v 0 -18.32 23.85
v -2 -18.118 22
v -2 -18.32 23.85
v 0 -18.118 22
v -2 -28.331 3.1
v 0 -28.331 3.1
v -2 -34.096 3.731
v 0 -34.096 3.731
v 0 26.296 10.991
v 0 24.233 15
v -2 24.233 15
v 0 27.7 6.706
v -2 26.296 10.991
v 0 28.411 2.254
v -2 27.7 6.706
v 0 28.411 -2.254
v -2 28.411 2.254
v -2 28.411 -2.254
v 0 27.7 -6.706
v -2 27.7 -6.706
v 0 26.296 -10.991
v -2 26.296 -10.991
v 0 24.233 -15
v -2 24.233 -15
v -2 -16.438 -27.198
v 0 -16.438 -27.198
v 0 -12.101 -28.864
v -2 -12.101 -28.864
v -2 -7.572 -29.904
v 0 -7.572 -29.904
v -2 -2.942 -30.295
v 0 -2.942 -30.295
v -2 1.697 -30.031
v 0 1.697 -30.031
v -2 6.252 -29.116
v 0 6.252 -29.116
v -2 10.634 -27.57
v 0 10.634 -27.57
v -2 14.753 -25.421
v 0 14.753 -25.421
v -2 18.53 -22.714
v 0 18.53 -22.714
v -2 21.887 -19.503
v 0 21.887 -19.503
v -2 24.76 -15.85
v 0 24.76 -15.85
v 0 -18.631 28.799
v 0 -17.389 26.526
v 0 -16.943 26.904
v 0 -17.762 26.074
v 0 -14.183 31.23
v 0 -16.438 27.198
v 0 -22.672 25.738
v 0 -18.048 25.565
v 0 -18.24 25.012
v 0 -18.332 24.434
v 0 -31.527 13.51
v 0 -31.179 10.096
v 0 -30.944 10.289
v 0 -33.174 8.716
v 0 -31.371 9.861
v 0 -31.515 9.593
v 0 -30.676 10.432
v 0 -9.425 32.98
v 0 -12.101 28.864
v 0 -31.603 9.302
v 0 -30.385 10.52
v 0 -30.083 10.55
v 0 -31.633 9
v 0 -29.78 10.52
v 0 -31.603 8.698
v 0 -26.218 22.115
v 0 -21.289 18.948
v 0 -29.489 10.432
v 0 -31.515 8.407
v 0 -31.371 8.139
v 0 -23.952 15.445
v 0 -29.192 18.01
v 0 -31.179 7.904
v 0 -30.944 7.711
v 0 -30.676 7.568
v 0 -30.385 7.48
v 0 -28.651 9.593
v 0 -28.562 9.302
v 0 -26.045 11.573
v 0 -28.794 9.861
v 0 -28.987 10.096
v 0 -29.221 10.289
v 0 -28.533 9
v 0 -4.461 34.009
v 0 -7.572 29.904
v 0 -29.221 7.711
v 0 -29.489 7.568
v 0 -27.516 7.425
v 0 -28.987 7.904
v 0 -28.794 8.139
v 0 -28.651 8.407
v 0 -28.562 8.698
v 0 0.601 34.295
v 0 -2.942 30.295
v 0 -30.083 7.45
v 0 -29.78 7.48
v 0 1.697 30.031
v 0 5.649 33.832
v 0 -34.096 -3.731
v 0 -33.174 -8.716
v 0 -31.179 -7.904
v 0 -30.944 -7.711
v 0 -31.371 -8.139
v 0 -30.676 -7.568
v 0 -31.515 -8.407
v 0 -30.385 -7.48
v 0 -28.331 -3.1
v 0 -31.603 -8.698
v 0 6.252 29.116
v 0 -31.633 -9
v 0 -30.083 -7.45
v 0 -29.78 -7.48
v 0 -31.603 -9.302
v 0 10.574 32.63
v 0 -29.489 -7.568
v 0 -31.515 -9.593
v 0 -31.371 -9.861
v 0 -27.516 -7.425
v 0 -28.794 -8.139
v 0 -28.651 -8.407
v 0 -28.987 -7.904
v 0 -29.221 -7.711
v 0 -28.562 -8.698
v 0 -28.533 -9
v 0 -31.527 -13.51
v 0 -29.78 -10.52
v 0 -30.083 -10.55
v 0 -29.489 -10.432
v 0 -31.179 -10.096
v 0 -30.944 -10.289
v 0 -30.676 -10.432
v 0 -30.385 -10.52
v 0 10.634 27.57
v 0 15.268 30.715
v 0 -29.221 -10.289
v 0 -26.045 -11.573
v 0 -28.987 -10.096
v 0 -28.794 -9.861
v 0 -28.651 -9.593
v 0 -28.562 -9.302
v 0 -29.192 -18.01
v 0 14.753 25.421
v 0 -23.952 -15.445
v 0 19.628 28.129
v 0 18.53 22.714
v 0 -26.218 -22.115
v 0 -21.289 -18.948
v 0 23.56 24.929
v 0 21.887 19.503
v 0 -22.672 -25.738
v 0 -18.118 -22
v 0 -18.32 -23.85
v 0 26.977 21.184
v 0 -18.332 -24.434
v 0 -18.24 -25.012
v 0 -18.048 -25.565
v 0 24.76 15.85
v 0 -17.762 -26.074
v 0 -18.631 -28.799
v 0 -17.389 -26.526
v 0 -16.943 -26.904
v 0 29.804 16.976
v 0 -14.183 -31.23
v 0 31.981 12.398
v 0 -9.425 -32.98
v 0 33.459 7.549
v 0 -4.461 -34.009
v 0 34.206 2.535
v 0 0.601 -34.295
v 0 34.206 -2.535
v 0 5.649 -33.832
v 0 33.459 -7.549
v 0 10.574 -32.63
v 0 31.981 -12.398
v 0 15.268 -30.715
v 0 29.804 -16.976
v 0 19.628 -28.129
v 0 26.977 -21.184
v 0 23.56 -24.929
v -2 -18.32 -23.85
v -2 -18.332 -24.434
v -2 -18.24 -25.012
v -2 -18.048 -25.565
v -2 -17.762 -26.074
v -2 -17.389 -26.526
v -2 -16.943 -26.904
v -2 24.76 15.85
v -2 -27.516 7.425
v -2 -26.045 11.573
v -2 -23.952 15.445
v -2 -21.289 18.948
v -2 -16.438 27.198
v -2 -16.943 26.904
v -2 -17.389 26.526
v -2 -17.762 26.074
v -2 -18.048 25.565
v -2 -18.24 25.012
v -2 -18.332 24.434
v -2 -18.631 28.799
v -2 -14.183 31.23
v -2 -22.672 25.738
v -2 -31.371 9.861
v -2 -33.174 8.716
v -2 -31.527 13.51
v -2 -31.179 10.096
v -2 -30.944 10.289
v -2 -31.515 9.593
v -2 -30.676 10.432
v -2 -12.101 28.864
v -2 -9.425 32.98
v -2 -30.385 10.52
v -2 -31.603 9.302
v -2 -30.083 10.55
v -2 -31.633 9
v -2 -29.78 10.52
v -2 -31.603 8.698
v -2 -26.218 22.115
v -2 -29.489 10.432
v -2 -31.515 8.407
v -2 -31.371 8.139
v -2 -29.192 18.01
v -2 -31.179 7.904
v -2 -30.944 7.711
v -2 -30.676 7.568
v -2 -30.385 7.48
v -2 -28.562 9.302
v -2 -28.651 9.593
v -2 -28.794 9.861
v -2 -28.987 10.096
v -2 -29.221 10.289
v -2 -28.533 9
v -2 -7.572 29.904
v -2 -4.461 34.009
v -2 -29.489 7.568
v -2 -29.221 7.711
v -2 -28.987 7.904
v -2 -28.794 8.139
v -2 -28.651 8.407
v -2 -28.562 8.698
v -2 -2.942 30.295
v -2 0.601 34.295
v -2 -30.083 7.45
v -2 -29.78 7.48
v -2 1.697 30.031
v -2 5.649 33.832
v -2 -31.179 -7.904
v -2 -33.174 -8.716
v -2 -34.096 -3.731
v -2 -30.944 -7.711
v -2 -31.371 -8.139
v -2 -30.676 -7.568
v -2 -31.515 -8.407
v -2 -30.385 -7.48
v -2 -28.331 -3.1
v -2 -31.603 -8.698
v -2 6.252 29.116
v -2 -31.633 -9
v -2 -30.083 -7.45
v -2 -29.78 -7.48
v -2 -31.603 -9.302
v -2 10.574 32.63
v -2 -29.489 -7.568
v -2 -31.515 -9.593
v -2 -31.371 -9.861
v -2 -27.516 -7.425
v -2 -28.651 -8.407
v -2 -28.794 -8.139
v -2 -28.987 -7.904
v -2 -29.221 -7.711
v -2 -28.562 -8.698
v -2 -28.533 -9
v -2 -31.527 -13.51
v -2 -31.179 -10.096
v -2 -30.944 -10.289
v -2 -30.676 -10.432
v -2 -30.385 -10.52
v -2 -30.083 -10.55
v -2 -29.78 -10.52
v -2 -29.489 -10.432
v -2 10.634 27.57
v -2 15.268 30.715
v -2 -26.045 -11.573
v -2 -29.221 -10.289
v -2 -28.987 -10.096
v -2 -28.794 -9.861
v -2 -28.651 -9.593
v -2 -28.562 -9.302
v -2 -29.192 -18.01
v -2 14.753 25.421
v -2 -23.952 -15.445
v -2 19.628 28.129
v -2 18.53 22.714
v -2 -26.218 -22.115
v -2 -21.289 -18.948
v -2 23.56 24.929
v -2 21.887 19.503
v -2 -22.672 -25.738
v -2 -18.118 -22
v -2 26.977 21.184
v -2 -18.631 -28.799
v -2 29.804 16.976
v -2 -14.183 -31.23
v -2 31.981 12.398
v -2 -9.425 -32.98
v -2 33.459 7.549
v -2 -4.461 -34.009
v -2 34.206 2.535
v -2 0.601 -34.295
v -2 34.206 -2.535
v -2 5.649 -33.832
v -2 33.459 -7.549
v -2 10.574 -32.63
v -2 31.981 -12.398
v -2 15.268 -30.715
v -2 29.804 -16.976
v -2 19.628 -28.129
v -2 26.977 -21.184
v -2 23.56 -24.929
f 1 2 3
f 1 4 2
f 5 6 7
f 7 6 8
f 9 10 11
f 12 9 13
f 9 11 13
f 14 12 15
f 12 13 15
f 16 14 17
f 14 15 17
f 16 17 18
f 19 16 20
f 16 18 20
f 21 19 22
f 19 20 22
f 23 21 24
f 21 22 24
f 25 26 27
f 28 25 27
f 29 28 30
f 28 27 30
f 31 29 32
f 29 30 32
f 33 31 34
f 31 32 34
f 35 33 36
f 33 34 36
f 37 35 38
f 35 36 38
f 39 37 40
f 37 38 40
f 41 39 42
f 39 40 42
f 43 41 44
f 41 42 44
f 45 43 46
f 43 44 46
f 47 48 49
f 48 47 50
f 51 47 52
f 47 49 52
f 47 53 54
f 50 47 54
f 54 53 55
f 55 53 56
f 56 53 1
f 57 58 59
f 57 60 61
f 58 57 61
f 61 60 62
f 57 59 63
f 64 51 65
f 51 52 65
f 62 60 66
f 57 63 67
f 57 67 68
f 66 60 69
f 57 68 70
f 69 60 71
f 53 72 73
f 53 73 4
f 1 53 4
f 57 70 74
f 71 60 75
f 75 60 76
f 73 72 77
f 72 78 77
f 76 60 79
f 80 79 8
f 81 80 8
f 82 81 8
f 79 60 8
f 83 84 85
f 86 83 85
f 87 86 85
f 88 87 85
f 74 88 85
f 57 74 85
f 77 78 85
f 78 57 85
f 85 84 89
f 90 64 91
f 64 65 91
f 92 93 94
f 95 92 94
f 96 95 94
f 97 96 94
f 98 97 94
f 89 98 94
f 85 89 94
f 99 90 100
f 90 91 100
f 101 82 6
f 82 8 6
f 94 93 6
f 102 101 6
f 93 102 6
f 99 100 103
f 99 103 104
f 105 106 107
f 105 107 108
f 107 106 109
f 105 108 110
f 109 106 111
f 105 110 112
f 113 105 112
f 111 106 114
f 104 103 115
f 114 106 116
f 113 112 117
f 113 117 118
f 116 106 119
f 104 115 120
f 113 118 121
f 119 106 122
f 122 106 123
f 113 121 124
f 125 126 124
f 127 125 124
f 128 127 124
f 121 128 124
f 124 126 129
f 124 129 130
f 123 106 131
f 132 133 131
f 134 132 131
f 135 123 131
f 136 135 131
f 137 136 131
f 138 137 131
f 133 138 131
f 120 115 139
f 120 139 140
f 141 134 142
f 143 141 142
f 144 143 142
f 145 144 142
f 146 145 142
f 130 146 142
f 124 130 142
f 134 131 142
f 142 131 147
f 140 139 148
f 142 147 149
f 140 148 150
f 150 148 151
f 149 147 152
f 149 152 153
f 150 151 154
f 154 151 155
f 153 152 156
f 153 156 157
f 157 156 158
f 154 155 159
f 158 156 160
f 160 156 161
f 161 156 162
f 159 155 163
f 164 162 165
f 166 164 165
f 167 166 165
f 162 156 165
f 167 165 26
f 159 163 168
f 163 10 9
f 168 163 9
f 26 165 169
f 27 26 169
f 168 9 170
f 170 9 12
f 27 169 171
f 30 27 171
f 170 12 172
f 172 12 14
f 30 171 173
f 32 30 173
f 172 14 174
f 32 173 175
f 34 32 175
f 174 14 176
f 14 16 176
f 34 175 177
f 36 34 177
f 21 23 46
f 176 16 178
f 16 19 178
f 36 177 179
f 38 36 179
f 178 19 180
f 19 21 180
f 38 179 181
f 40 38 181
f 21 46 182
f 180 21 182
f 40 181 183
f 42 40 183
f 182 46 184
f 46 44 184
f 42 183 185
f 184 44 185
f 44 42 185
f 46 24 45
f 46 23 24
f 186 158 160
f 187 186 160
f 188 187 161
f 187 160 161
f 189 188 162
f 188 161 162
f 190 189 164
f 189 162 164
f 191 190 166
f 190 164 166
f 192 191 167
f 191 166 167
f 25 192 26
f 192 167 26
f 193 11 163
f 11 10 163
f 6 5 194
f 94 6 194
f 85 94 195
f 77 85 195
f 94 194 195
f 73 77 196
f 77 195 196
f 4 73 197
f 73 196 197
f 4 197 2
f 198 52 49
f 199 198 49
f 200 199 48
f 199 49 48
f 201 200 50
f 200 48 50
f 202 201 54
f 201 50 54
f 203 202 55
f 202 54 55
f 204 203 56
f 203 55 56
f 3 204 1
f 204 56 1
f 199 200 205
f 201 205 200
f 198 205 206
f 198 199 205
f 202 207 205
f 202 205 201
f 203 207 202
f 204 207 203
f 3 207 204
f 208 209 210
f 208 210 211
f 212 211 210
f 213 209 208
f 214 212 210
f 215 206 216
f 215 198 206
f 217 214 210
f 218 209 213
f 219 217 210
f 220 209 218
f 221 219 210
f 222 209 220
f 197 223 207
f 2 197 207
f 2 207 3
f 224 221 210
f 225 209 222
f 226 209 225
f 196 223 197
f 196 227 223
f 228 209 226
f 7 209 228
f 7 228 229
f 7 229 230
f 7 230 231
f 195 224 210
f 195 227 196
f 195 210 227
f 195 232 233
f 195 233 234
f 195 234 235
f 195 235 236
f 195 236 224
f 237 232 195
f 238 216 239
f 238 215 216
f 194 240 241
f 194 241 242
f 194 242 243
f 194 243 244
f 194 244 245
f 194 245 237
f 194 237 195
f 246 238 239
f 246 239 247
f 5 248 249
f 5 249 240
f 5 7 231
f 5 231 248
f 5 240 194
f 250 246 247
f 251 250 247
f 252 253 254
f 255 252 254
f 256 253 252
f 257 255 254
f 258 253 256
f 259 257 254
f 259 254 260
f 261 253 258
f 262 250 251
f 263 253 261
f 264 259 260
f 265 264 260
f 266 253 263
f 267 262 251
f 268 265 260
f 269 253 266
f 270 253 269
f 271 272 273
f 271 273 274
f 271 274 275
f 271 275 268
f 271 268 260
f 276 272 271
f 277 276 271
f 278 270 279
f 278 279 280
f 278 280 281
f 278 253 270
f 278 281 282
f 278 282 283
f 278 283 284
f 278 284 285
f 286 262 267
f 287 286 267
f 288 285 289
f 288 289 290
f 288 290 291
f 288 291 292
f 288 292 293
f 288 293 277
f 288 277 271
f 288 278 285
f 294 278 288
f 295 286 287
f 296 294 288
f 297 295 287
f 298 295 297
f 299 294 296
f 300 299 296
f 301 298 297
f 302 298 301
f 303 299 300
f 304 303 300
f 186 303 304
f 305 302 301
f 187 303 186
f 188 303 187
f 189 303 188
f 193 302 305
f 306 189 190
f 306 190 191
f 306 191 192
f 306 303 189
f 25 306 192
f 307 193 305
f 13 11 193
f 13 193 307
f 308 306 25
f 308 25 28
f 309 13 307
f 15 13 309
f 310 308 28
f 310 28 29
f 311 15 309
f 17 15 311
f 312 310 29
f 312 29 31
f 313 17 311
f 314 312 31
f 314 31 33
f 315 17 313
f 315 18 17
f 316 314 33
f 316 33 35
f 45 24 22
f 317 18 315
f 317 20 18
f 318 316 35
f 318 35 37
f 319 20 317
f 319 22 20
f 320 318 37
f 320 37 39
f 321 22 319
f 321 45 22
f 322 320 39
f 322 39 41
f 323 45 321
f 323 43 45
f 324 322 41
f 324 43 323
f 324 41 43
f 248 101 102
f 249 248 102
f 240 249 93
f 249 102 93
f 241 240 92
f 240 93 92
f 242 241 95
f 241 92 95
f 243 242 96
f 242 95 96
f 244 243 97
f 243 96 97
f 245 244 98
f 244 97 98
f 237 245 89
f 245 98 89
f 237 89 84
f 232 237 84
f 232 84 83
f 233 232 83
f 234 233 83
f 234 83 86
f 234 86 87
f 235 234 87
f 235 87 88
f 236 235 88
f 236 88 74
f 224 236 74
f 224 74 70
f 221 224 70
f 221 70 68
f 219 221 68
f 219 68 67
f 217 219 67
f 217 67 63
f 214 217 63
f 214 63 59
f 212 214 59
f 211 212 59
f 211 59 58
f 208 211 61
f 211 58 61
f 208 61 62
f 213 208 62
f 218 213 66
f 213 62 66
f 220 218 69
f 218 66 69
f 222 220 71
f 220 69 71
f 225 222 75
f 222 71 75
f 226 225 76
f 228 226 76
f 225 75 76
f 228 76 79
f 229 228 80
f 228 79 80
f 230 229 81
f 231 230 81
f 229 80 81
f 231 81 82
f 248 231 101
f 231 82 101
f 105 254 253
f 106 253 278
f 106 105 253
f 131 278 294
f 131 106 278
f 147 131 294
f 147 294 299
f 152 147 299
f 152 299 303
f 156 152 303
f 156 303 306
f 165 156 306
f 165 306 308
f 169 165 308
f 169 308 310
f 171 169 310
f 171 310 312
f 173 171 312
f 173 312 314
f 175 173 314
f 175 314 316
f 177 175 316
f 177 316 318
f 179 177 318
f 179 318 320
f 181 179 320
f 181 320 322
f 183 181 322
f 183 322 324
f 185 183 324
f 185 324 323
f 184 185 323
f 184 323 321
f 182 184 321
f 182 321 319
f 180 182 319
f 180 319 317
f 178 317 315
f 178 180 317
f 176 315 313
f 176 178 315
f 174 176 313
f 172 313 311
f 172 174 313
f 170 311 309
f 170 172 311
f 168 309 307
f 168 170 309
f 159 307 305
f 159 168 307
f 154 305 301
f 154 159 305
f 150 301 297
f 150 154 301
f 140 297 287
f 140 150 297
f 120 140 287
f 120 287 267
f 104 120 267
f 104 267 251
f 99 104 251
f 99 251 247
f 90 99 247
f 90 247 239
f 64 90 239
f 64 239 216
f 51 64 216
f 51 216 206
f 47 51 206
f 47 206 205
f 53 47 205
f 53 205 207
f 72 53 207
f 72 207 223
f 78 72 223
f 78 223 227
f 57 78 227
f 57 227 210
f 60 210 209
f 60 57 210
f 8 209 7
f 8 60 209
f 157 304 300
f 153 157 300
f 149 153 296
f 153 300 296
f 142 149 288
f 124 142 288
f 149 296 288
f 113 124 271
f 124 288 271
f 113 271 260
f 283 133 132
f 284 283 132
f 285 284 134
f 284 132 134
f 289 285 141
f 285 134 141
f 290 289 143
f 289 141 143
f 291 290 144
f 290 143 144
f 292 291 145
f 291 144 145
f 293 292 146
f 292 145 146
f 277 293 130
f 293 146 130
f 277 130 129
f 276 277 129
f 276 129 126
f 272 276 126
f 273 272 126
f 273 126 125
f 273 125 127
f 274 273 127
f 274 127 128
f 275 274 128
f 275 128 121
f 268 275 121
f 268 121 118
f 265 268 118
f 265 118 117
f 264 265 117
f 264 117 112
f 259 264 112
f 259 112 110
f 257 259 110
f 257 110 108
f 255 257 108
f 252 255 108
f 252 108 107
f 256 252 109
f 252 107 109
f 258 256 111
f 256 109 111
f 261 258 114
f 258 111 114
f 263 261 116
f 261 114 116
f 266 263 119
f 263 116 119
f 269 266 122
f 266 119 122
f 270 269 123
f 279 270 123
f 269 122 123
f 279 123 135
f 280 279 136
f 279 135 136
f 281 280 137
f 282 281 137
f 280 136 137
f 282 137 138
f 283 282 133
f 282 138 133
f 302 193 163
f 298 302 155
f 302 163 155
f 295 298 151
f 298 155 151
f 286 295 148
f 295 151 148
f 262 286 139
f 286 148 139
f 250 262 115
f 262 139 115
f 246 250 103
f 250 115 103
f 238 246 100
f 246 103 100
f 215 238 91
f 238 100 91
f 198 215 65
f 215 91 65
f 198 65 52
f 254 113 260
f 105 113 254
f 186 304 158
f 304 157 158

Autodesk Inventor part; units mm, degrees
ref_plane "YZ Plane" through (0, 0, 0) normal (1, 0, 0) x (0, 1, 0)
ref_plane "XZ Plane" through (0, 0, 0) normal (0, 1, 0) x (-1, 0, 0)
ref_plane "XY Plane" through (0, 0, 0) normal (0, 0, 1) x (1, 0, 0)
sketch "Sketch1" plane through (0, 0, 0) normal (0, 0, 1) x (1, 0, 0)
  line L0 (0, 0) -> (-75.2784, 0)
  line L1 (0, 28.5) -> (-2, 28.5)
  line L2 (-2, 28.5) -> (-2, 34.3)
  line L3 (-2, 34.3) -> (0, 34.3)
  line L4 (0, 34.3) -> (0, 28.5)
  point P0 (0, 0)
  dimension "d0" = 2
  dimension "d1" = 57
  dimension "d2" = 68.6
revolve "Revolution1" add sketch "Sketch1" angle 360 about axis through (0, 0, 0) along (-1, 0, 0)
sketch "Sketch2" plane through (0, 0, 0) normal (1, 0, 0) x (0, 0, -1)
  circle A0 centre (0, 0) radius 28.5 projected
  line L0 (0, 0) -> (15, 24.2332) construction
  line L1 (0, 0) -> (-15, 24.2332) construction
  line L2 (0, 0) -> (3.1, -28.3309) construction
  line L3 (0, 0) -> (-3.1, -28.3309) construction
  circle A1 centre (0, 0) radius 34.3 projected
  line L4 (3.1, -28.3309) -> (3.7309, -34.0965)
  line L5 (-3.1, -28.3309) -> (-3.7309, -34.0965)
  line L6 (15, 24.2332) -> (15.8503, 24.7596)
  line L7 (-15, 24.2332) -> (-15.8503, 24.7596)
  line L8 (0, 0) -> (22, -18.1177) construction
  line L9 (0, 0) -> (-22, -18.1177) construction
  circle A2 centre (0, 0) radius 31.8 construction
  line L10 (-22, -18.1177) -> (-23.8497, -18.3201)
  line L11 (22, -18.1177) -> (23.8497, -18.3201)
  arc A3 (-27.1979, -16.4377) -> (-23.8497, -18.3201) centre (-24.2087, -15.0396) ccw
  arc A4 (23.8497, -18.3201) -> (27.1979, -16.4377) centre (24.2087, -15.0396) ccw
  arc A5 (-15.8503, 24.7596) -> (-27.1979, -16.4377) centre (2.6227, -2.4902) ccw
  arc A6 (27.1979, -16.4377) -> (15.8503, 24.7596) centre (-2.6227, -2.4902) ccw
  circle A7 centre (0, 0) radius 31.4 construction
  line L12 (3.4154, -31.2137) -> (18.4181, -29.5721) construction
  circle A8 centre (9, -30.0826) radius 1.55
  circle A9 centre (-9, -30.0826) radius 1.55
  dimension "d4" = 30
  dimension "d5" = 6.2
  dimension "d6" = 1
  dimension "d7" = 44
  dimension "d8" = 2.5
  dimension "d9" = 32.9211
  dimension "d10" = 3.1
  dimension "d11" = 18
extrude "Extrusion1" cut sketch "Sketch2" against normal through all contours A0 L6 A6 A4 L11 | A0 L10 A3 A5 L7 | L4 A1 L5 A0 | A8 | A9
properties part number "3136 7009 59"
